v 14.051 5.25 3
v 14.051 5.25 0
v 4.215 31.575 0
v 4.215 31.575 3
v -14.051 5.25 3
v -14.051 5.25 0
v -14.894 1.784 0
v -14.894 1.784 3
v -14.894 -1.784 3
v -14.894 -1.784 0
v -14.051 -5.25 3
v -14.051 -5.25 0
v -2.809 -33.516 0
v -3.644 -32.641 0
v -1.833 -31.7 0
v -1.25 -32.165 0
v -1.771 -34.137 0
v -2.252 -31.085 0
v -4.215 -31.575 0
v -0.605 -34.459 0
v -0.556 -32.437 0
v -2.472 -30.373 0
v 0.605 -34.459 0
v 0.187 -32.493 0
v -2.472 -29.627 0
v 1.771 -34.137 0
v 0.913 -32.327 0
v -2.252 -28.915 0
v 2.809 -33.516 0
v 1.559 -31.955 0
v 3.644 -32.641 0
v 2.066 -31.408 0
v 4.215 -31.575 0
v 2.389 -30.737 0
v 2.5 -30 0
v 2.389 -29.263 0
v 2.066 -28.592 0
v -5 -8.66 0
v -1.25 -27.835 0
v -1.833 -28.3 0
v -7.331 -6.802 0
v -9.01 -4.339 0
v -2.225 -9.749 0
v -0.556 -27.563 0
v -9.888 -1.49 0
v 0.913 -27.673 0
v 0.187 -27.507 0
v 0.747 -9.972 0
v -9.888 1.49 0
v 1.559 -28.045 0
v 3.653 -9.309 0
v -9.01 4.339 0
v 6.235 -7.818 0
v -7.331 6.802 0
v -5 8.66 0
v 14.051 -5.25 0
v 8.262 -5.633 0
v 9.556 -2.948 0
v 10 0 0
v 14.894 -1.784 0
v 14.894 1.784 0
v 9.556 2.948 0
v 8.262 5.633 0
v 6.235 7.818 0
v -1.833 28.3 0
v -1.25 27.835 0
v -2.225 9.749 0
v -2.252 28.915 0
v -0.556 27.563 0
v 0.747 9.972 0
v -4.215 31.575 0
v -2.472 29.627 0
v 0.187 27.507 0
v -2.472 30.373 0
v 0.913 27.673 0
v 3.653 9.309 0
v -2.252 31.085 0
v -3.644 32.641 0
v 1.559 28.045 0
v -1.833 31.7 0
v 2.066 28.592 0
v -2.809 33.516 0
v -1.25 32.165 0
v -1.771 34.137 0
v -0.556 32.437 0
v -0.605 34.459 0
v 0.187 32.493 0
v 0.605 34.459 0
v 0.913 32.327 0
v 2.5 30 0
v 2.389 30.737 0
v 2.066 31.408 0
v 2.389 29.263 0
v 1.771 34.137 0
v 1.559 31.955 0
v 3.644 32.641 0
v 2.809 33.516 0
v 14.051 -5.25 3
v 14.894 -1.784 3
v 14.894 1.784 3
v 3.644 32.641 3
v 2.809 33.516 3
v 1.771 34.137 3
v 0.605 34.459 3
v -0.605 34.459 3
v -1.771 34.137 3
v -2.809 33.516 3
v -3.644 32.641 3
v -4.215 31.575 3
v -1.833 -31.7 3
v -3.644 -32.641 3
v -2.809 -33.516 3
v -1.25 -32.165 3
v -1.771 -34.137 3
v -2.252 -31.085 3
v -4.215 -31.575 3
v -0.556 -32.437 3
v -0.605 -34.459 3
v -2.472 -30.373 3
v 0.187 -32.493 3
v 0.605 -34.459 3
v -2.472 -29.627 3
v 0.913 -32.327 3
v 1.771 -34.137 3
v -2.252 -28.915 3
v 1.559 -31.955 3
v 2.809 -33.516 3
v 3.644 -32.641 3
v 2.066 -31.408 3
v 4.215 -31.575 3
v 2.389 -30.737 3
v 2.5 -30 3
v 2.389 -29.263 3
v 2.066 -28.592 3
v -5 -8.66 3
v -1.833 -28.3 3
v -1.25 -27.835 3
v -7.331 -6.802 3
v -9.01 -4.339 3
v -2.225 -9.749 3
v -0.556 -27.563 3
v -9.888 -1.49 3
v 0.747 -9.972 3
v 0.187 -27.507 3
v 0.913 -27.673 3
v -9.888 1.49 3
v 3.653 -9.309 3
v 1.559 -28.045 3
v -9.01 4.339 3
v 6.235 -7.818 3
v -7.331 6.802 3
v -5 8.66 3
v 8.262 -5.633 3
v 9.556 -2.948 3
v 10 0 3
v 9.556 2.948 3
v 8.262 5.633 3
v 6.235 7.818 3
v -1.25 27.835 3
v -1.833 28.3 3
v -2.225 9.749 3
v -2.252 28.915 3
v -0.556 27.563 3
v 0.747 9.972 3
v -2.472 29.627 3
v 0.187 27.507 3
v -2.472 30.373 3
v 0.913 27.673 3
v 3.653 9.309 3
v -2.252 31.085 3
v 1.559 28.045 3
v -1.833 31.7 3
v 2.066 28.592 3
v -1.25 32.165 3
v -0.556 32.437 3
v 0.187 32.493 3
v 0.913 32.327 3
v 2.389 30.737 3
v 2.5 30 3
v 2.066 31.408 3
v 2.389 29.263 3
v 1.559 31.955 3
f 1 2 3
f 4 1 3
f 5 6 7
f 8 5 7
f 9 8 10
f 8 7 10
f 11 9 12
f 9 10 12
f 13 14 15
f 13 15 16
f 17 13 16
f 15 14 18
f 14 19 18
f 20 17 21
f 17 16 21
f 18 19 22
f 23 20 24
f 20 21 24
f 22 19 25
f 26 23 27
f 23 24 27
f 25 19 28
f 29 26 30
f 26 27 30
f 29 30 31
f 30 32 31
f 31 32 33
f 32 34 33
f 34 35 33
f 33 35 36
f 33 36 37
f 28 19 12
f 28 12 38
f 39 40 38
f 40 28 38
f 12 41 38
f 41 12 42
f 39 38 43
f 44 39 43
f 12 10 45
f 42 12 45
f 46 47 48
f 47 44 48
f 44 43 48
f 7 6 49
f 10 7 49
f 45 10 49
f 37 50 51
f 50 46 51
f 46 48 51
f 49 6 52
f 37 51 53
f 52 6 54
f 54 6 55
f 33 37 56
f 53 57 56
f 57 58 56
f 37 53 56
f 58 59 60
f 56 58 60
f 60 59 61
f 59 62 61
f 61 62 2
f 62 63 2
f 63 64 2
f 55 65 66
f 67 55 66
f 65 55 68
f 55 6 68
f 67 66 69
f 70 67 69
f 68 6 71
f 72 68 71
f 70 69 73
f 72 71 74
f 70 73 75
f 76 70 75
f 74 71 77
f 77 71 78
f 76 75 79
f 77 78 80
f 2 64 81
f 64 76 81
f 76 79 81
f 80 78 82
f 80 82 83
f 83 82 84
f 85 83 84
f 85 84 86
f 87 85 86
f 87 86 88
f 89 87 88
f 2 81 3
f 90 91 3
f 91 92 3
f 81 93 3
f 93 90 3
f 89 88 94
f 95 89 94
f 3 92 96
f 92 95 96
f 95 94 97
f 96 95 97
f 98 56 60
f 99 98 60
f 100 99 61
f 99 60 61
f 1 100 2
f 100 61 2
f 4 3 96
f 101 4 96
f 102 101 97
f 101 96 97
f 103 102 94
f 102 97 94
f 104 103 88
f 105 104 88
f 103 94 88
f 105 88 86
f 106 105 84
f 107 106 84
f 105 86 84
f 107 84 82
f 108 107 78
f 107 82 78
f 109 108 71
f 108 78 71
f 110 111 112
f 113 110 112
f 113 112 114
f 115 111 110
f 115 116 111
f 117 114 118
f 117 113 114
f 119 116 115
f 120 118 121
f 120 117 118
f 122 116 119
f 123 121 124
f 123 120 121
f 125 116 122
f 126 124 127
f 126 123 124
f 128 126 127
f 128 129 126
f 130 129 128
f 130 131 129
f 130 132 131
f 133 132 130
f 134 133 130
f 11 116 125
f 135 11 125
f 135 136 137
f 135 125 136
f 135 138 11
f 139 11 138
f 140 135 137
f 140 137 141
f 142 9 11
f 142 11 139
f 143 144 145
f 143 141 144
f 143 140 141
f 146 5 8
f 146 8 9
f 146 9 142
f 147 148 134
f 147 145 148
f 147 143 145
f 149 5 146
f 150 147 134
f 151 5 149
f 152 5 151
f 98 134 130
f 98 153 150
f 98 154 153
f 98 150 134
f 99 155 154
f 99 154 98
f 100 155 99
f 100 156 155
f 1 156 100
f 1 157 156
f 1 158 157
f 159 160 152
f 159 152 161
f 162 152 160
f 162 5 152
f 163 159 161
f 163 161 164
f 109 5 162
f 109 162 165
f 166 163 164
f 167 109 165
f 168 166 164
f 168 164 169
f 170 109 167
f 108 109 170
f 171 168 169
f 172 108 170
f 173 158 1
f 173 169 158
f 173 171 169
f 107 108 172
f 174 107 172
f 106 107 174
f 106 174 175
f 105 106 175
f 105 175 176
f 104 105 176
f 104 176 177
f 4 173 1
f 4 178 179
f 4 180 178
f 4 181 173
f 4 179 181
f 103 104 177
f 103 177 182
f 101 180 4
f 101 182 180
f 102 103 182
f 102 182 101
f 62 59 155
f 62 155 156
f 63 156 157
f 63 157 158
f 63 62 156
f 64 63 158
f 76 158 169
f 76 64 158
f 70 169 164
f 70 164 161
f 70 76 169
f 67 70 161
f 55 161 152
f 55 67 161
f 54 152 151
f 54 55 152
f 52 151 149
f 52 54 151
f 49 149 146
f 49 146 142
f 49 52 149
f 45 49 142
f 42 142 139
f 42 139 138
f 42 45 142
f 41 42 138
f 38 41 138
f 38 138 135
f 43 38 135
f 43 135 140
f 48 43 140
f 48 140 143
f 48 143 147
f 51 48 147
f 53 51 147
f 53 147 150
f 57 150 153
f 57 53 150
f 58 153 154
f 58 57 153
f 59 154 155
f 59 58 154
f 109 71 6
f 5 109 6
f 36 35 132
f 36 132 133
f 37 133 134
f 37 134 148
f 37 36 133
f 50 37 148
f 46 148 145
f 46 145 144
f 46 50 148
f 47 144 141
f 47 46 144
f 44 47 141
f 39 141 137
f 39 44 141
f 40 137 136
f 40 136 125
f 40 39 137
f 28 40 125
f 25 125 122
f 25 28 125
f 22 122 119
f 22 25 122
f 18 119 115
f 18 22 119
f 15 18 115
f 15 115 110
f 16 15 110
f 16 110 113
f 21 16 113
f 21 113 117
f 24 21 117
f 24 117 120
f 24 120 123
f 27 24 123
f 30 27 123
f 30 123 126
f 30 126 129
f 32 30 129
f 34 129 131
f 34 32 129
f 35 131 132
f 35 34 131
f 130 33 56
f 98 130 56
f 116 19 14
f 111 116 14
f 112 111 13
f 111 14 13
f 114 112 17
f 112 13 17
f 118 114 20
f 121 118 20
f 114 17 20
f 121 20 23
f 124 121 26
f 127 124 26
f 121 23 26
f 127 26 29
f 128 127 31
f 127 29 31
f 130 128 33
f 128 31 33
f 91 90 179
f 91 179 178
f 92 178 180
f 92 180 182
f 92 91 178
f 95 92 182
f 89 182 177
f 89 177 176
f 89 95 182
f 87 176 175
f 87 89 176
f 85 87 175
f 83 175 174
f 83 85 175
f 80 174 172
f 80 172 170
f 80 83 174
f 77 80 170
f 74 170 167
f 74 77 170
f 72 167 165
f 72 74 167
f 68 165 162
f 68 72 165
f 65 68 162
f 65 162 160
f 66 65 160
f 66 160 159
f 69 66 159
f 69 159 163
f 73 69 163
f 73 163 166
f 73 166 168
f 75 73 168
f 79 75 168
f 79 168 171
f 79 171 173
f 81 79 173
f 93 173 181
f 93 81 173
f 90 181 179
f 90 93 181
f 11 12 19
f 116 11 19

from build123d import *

# Parameters (mm, degrees)
SKETCH_1_R      = 2.5
SKETCH_1_R_2    = 10
EXTRUDE_1_DEPTH = 3


with BuildPart() as part:
    # 草图1 → 凸台-拉伸1 (new body)
    with BuildSketch(Plane.XY):
        with BuildLine():
            Line((-4.215373649, 31.575), (-14.051245496, 5.25))
            ThreePointArc((-14.051245496, 5.25), (-15, 0), (-14.051245496, -5.25))
            Line((-14.051245496, -5.25), (-4.215373649, -31.575))
            ThreePointArc((-4.215373649, -31.575), (0, -34.5), (4.215373649, -31.575))
            Line((4.215373649, -31.575), (14.051245496, -5.25))
            ThreePointArc((14.051245496, -5.25), (15, 0), (14.051245496, 5.25))
            Line((14.051245496, 5.25), (4.215373649, 31.575))
            ThreePointArc((4.215373649, 31.575), (0, 34.5), (-4.215373649, 31.575))
        make_face()
        with Locations((0, 30)):
            Circle(SKETCH_1_R, mode=Mode.SUBTRACT)
        with Locations((0, -30)):
            Circle(SKETCH_1_R, mode=Mode.SUBTRACT)
        Circle(SKETCH_1_R_2, mode=Mode.SUBTRACT)
    extrude(amount=EXTRUDE_1_DEPTH)


solid = part.part
